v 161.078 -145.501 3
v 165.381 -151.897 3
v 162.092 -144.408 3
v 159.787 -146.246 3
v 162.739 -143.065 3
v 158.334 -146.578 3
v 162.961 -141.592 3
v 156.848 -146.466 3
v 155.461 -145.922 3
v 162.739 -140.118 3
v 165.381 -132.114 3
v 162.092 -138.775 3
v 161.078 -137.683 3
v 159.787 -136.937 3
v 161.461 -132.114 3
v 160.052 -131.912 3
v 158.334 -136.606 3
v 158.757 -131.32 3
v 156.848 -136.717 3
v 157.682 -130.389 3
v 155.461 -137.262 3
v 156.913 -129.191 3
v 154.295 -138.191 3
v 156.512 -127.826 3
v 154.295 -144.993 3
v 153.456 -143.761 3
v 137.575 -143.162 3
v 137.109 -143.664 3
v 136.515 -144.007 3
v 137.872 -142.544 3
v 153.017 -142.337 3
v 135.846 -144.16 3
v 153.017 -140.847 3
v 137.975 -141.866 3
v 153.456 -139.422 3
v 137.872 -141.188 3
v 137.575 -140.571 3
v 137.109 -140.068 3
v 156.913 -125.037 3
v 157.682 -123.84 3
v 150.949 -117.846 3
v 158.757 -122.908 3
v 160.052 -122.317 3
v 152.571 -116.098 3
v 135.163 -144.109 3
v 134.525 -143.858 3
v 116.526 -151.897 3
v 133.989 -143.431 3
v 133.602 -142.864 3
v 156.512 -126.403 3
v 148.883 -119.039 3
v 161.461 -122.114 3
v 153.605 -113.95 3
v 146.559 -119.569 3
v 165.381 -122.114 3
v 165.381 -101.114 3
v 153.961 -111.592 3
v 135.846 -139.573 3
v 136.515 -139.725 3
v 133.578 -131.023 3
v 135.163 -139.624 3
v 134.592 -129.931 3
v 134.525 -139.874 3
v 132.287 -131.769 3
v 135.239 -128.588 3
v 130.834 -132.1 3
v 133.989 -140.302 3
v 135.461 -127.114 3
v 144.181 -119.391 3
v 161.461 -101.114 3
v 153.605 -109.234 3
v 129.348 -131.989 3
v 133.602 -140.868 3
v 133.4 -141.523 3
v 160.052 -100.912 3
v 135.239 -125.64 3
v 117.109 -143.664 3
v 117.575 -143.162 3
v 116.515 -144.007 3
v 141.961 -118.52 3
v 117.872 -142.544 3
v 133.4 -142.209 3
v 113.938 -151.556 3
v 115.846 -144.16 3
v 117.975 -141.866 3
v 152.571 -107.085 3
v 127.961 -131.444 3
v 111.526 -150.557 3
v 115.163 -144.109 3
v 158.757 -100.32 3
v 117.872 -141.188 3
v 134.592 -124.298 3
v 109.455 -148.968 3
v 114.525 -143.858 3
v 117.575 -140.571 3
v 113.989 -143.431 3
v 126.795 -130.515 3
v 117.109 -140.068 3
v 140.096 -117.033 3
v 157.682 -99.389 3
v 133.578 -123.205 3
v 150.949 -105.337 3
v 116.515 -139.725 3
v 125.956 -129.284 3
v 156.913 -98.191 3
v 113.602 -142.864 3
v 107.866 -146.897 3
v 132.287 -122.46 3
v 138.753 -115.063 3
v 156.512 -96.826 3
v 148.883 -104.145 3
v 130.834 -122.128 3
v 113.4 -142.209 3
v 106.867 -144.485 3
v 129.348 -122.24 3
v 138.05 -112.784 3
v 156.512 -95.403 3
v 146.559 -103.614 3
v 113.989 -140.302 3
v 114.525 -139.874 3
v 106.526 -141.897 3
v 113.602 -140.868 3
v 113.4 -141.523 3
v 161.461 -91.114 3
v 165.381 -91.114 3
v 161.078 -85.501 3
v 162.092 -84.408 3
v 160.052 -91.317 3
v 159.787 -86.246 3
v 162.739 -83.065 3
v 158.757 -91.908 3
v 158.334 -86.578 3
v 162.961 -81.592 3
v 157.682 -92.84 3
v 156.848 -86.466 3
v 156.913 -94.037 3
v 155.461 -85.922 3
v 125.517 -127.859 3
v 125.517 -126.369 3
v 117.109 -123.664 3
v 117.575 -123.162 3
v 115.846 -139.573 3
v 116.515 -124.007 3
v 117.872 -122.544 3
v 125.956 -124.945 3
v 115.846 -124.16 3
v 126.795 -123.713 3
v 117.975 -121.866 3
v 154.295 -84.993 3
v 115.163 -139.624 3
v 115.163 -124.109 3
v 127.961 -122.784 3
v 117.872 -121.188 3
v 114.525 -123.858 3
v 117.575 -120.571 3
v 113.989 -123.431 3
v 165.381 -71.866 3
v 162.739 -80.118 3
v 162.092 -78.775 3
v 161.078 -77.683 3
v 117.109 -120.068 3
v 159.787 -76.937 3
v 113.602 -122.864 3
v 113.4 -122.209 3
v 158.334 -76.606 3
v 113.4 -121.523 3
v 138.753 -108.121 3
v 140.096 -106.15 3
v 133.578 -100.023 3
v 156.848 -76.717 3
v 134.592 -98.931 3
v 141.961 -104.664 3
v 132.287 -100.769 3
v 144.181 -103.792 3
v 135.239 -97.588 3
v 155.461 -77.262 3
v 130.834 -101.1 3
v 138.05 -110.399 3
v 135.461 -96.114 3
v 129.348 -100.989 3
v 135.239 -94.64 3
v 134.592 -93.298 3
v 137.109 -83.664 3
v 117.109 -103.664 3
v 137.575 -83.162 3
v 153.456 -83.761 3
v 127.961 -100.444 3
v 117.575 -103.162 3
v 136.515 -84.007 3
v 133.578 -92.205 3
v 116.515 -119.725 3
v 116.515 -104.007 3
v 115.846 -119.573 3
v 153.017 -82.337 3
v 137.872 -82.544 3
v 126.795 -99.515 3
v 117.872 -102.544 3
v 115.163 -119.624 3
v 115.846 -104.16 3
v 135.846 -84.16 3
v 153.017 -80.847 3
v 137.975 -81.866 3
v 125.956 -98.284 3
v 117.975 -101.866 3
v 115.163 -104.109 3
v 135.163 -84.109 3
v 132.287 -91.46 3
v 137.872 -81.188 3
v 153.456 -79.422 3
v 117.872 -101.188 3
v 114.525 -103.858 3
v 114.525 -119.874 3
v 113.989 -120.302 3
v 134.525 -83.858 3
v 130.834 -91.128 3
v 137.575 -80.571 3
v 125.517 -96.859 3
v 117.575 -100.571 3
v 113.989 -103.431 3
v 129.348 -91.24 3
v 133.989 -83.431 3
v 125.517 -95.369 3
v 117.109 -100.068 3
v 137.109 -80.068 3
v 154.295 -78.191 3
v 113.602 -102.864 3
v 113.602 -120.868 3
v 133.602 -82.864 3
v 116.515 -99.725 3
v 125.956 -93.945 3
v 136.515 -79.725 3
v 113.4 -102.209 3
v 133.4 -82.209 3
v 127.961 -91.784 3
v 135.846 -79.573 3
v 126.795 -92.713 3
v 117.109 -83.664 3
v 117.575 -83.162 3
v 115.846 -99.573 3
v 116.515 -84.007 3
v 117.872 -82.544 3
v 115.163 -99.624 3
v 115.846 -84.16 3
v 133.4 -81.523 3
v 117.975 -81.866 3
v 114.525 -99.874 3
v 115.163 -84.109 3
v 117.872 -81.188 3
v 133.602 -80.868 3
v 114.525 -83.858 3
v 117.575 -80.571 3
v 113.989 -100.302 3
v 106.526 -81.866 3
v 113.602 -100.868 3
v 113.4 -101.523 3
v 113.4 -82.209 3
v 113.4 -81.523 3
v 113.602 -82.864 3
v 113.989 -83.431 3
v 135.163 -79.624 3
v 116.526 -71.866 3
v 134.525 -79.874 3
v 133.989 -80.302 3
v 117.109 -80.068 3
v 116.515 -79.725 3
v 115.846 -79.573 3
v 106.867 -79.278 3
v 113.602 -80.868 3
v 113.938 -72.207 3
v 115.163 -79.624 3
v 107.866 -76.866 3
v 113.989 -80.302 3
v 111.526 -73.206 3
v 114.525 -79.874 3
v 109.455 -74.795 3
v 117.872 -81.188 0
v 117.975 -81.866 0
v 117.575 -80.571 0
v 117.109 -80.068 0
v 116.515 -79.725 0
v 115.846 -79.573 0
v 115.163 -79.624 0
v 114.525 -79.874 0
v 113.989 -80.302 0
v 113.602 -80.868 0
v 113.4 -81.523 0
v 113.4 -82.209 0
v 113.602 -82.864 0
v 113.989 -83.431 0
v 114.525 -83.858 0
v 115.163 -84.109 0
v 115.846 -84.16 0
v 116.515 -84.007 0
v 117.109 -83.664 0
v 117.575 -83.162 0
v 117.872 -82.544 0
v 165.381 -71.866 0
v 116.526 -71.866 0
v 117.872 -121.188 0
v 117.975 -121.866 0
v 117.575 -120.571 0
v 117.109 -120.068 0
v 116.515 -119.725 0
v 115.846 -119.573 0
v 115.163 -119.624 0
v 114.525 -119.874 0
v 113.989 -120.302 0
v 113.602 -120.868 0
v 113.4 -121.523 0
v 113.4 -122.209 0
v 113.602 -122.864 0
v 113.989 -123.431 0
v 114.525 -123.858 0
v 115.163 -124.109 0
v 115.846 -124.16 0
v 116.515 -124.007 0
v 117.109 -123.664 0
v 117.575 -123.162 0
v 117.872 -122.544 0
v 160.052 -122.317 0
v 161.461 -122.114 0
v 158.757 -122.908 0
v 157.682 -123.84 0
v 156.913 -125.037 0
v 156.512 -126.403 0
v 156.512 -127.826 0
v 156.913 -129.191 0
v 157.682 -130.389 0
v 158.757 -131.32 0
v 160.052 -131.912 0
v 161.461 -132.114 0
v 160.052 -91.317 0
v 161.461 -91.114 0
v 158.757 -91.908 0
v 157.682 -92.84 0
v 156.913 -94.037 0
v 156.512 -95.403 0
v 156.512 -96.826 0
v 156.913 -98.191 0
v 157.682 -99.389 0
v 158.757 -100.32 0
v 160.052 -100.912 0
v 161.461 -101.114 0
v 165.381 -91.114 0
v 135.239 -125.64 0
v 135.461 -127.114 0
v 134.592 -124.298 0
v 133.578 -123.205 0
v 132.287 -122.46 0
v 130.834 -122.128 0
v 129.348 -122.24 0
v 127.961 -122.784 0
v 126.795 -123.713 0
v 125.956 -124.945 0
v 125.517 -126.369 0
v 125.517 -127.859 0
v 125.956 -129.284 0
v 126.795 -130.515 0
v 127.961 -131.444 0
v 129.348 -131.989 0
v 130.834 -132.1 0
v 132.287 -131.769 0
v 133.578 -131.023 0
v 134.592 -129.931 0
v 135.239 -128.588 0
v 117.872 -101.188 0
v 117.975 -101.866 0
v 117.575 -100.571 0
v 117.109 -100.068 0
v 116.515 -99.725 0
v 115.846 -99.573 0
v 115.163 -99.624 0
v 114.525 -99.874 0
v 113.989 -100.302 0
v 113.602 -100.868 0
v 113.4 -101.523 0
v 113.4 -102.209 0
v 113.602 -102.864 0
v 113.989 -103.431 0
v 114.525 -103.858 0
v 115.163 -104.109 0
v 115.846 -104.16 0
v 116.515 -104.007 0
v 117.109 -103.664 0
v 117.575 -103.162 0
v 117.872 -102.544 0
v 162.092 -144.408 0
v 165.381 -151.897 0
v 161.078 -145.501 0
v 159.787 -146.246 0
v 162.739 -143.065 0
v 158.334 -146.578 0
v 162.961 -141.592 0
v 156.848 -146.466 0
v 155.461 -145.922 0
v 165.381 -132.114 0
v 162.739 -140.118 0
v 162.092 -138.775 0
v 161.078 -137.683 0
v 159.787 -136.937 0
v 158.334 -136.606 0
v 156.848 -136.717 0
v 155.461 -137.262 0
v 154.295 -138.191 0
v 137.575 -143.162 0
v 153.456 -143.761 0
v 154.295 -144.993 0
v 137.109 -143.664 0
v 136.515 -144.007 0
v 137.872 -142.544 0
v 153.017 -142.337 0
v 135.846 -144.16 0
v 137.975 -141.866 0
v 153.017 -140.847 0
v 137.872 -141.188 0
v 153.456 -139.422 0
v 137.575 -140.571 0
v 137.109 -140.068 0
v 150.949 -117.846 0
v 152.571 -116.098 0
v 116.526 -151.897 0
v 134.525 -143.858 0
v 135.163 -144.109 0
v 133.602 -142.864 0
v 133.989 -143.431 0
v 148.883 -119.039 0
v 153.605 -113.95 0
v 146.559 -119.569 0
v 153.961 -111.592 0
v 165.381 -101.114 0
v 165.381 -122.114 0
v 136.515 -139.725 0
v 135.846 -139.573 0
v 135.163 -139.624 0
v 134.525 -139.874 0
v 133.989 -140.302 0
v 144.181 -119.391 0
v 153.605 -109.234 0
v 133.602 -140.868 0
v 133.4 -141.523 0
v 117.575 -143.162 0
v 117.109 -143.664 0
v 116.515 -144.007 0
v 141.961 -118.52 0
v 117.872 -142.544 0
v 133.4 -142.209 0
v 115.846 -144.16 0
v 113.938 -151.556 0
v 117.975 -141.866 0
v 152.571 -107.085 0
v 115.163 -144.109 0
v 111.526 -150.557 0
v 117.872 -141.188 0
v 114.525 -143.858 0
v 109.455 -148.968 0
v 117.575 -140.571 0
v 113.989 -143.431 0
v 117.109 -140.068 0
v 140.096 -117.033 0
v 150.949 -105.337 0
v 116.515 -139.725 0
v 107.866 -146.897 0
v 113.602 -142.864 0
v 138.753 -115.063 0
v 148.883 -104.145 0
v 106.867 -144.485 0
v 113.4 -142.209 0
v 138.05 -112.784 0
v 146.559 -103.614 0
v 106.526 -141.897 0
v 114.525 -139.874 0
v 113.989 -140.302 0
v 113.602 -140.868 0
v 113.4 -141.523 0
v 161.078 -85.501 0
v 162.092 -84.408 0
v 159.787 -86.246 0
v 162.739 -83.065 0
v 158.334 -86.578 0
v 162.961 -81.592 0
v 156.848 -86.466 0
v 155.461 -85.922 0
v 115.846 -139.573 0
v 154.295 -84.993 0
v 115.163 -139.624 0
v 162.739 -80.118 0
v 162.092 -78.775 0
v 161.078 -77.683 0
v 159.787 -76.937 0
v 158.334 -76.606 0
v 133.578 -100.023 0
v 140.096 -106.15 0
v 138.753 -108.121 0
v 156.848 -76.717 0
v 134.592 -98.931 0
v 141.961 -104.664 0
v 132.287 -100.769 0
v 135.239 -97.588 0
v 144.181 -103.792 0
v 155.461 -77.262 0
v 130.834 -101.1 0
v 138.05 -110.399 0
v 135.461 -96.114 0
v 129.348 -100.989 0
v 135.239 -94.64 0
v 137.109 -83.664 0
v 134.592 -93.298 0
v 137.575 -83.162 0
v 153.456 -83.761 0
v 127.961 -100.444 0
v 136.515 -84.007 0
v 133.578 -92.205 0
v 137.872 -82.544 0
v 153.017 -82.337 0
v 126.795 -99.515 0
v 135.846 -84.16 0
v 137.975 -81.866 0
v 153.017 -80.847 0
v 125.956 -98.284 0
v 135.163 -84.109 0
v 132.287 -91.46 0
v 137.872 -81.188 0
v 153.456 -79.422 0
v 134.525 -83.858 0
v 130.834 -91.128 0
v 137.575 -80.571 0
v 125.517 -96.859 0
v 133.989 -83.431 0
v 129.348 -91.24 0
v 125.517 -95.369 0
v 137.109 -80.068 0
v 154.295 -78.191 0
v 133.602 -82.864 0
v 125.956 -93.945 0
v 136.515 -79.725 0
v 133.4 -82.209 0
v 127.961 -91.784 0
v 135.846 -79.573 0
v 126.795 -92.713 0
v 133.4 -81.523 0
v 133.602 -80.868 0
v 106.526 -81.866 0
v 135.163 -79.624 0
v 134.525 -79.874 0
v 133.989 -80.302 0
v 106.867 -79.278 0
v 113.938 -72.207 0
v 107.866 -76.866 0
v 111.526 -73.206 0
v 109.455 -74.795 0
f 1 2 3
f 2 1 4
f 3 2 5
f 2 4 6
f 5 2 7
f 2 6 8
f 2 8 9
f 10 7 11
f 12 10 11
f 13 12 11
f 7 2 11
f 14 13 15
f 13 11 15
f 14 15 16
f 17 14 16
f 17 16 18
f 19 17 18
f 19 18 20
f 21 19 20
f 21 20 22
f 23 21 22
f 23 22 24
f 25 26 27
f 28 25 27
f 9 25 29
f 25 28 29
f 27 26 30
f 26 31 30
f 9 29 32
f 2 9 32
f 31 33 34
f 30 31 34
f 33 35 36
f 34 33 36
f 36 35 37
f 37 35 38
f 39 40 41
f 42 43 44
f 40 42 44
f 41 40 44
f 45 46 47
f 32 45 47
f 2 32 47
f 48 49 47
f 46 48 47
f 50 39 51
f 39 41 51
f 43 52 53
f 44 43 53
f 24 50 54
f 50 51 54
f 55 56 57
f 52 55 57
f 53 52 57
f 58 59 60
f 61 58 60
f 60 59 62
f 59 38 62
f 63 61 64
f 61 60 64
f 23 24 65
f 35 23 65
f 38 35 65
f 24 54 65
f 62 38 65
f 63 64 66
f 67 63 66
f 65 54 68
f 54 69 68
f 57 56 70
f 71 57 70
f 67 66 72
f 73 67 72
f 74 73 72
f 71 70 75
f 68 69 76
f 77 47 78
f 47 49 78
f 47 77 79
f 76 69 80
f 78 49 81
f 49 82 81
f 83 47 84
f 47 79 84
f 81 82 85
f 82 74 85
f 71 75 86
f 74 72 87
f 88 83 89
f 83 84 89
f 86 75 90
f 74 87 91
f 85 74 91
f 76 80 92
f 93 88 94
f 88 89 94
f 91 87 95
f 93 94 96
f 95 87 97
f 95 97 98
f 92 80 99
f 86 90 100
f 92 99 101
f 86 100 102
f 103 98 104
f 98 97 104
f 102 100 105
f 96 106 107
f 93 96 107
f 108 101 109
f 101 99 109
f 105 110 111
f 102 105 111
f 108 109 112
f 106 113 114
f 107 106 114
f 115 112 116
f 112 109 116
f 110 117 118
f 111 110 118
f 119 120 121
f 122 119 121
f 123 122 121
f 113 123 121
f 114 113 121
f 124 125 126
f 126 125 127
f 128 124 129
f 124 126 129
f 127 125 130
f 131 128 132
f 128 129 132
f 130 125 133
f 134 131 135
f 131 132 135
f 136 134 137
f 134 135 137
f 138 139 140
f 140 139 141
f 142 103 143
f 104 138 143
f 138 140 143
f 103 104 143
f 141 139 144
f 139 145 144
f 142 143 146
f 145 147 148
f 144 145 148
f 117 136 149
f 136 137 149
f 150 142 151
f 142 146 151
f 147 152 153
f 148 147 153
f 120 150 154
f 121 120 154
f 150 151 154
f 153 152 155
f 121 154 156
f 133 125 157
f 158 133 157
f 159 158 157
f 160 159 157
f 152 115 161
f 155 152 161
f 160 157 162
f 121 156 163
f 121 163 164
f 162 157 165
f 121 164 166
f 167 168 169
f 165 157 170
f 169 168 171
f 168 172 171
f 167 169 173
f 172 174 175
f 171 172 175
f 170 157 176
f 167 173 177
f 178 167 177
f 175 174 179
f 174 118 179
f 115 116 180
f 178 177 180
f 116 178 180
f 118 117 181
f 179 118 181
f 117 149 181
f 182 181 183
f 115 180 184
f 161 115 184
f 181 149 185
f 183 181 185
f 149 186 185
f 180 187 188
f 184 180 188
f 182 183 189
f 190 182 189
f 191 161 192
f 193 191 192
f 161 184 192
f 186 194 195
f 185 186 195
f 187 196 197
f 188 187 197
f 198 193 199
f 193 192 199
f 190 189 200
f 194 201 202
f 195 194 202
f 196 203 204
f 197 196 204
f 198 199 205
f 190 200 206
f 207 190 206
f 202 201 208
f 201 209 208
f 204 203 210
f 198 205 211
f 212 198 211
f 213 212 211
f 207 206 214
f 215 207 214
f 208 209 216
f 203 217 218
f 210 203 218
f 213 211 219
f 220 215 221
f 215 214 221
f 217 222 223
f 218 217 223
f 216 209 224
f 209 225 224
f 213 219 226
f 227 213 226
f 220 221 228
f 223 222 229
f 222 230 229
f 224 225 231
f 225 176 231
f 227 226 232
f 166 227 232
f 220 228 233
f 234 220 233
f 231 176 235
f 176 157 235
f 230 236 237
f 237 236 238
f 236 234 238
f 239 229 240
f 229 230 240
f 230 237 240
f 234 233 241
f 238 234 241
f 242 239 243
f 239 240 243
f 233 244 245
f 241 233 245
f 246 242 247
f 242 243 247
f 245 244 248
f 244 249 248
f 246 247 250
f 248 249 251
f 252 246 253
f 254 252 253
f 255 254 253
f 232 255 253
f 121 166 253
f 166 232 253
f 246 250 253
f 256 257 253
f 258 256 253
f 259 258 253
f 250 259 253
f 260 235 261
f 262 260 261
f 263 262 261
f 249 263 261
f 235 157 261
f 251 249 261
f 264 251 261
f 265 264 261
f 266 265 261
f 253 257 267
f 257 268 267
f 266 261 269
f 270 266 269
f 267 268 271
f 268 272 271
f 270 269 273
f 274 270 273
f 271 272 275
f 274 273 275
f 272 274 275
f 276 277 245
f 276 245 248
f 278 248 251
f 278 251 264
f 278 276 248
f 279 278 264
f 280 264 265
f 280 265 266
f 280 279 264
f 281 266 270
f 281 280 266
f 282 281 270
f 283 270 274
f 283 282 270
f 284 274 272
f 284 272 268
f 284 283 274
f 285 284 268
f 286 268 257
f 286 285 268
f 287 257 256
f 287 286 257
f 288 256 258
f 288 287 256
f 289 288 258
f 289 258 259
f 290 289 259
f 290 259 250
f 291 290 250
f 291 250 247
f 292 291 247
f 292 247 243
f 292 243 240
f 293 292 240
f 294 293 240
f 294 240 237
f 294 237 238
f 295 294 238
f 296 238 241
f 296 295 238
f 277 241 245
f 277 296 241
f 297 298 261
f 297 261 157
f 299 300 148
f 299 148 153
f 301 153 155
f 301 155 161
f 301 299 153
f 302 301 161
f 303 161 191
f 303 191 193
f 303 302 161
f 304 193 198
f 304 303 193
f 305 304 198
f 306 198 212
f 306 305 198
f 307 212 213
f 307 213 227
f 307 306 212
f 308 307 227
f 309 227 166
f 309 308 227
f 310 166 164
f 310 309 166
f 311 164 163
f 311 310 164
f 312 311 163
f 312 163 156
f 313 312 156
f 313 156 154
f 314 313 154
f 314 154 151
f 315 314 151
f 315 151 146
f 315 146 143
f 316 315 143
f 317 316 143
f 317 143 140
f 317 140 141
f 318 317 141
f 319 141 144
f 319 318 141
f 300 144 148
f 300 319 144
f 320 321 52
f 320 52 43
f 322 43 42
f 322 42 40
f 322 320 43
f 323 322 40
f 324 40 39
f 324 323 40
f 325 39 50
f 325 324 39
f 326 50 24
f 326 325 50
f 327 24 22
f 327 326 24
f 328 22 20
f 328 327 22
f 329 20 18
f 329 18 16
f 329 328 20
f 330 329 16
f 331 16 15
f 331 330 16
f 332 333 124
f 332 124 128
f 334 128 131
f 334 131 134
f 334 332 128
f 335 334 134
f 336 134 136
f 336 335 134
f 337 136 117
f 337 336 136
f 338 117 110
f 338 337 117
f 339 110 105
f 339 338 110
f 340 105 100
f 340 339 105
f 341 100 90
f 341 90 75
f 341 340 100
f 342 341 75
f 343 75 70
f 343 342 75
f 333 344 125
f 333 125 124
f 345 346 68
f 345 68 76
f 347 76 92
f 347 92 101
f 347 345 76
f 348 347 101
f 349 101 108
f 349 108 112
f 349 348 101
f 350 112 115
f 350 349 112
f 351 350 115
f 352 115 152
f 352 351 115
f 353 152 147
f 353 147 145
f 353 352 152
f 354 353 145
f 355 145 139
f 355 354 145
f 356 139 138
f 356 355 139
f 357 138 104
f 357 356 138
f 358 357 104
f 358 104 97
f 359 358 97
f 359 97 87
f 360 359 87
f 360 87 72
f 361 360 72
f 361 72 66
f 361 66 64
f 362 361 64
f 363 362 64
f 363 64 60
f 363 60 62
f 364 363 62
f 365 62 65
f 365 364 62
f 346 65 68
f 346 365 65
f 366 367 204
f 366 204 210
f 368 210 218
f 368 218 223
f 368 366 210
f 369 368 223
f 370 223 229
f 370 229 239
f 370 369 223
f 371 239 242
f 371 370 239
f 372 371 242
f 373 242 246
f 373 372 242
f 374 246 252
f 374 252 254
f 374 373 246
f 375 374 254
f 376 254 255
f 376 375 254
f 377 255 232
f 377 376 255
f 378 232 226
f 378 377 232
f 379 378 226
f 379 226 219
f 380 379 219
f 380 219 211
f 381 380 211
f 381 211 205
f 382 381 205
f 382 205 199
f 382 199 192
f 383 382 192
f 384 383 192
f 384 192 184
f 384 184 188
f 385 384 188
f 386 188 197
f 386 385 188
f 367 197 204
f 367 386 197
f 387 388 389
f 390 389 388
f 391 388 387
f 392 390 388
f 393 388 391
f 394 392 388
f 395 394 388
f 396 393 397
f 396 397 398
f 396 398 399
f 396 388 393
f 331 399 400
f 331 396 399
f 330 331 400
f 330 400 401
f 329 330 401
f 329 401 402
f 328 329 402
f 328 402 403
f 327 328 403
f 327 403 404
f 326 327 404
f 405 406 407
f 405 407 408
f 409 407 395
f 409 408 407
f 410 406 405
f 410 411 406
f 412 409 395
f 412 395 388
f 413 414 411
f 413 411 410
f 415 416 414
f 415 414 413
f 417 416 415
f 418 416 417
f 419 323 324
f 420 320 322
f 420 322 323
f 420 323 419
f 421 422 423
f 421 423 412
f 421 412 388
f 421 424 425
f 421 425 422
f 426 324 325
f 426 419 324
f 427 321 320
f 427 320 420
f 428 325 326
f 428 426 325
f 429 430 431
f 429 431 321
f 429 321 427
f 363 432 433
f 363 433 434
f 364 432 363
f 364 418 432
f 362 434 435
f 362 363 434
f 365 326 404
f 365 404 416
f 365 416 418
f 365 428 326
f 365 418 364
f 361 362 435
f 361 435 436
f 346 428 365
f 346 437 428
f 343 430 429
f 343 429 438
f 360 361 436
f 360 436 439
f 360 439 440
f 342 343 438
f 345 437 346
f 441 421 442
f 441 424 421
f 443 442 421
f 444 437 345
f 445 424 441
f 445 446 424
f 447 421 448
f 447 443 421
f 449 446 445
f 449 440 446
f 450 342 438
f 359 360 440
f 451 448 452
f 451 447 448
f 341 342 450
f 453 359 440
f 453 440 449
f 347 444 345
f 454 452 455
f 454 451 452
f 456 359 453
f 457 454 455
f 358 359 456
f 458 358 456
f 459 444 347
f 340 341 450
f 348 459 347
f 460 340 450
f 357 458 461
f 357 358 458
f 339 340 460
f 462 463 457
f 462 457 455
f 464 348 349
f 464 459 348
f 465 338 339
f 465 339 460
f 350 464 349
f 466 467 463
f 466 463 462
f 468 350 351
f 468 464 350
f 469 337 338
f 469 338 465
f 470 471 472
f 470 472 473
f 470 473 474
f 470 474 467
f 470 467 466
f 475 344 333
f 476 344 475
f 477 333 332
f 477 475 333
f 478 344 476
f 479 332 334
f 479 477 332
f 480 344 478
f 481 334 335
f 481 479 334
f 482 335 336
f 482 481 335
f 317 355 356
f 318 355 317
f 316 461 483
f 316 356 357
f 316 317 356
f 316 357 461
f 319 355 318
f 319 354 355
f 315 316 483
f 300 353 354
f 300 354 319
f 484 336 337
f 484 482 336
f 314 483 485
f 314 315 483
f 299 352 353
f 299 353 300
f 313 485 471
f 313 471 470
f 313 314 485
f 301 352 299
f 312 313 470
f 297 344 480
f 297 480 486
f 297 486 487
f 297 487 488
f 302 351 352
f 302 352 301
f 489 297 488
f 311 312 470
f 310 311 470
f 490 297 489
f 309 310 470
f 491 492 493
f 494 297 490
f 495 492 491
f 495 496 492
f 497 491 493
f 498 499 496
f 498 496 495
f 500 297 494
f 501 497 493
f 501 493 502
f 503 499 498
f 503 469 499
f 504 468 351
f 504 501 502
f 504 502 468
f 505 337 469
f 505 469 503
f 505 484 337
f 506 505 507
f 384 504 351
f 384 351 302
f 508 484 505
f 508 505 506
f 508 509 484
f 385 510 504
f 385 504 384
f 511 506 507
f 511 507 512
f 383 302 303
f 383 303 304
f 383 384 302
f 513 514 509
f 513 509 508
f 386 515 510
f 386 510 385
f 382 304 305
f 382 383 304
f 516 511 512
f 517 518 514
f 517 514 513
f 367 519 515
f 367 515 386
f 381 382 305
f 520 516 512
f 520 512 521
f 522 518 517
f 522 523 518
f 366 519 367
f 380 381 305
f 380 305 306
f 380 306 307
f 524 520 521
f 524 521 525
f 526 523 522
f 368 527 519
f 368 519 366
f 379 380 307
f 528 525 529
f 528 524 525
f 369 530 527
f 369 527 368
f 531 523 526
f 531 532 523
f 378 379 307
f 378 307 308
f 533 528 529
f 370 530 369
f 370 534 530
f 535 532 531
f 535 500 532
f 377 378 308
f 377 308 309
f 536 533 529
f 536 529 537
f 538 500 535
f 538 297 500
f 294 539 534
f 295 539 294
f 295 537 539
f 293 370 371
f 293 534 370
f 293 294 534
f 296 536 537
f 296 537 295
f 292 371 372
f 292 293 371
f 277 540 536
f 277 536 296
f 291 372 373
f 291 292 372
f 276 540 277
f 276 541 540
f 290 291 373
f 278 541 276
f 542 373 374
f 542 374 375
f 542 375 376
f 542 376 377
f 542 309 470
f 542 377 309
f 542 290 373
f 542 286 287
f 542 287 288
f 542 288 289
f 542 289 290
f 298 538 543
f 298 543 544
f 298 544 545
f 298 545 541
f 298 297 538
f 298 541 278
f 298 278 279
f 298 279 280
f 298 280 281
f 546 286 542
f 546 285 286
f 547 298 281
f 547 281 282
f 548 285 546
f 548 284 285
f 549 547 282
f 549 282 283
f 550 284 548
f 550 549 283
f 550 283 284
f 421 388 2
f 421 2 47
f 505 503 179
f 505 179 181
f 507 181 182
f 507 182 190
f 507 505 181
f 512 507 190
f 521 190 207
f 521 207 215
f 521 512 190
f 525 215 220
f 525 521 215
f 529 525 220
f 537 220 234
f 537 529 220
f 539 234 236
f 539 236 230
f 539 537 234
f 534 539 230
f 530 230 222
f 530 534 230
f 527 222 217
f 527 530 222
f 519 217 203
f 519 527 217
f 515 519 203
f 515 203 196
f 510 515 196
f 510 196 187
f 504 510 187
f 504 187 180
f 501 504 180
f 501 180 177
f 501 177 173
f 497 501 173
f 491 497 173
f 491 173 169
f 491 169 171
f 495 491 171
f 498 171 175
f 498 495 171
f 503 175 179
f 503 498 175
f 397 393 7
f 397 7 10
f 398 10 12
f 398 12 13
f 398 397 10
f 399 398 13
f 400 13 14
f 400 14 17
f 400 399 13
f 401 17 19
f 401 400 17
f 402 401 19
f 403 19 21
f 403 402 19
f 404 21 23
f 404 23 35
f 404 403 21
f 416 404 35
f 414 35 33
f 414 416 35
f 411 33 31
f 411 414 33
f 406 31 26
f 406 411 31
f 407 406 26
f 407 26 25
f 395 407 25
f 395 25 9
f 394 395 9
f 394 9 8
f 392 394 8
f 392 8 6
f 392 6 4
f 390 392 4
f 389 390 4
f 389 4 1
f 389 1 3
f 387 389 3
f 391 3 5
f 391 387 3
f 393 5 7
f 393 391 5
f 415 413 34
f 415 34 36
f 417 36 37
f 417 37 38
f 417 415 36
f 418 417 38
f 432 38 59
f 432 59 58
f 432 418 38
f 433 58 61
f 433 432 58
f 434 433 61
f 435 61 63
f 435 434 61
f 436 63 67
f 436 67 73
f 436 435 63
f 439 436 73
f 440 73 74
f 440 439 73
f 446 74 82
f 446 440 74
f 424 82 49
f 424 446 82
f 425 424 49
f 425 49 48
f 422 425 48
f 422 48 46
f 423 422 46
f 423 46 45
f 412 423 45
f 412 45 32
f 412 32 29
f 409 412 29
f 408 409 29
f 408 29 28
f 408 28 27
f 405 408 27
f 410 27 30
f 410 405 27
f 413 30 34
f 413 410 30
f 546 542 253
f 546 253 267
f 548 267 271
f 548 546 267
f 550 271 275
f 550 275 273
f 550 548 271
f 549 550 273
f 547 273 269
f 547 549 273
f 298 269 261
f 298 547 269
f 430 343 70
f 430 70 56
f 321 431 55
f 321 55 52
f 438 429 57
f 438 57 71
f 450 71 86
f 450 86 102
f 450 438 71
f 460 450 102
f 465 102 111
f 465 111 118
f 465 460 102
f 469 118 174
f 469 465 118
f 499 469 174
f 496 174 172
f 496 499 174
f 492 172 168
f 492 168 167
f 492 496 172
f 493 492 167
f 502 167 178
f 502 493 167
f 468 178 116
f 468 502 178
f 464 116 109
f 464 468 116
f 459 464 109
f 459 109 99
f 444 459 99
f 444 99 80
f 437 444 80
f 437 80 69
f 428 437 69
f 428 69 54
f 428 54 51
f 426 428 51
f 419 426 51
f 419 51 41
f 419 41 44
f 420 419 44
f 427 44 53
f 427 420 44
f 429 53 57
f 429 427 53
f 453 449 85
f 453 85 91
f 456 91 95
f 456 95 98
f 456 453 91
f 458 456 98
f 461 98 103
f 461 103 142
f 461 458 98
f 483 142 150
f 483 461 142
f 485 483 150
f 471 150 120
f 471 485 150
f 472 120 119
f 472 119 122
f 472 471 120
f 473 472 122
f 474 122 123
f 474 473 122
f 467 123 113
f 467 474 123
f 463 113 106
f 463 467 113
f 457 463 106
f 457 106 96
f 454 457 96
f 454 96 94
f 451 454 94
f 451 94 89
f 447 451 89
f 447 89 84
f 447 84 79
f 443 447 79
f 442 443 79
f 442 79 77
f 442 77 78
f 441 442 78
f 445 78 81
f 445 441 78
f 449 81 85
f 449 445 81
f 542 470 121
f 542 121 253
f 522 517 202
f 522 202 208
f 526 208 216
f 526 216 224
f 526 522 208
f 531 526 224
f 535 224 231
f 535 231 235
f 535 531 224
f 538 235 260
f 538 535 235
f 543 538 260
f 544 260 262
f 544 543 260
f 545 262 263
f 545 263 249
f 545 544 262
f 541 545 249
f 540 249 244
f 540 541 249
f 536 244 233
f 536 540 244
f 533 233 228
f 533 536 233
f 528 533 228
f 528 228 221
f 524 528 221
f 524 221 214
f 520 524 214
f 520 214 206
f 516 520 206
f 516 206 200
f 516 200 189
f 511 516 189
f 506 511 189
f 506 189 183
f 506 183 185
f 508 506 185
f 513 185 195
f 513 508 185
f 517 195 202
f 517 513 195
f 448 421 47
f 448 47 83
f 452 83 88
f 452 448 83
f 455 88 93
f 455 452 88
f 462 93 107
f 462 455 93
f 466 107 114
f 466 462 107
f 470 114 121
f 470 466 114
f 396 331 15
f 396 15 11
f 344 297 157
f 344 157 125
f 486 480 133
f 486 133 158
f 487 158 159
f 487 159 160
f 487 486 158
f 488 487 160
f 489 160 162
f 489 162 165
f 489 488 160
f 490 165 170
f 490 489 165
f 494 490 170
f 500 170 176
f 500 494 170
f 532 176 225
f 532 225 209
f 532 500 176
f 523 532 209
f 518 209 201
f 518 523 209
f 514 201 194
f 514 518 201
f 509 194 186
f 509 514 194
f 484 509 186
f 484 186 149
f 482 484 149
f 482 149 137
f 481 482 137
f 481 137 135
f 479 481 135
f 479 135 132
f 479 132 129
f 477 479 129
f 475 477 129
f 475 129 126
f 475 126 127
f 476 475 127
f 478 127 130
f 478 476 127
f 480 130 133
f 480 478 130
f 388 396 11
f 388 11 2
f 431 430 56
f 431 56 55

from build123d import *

# Parameters (mm, degrees)
SKETCH1_R           = 2.3
SKETCH1_R_2         = 5
SKETCH1_R_3         = 8
BOSS_EXTRUDE1_DEPTH = 3


with BuildPart() as part:
    # Sketch1 → Boss-Extrude1 (new body)
    with BuildSketch(Plane.XY):
        with BuildLine():
            Line((157.960700719, -71.866196008), (165.380720324, -71.866196008))
            Line((165.380720324, -71.866196008), (165.380720324, -91.114221831))
            Line((165.380720324, -91.114221831), (161.460700719, -91.114221831))
            ThreePointArc((161.460700719, -91.114221831), (156.460700719, -96.114221831), (161.460700719, -101.114221831))
            Line((161.460700719, -101.114221831), (165.380720324, -101.114221831))
            Line((165.380720324, -101.114221831), (165.380720324, -122.114221831))
            Line((165.380720324, -122.114221831), (161.460700719, -122.114221831))
            ThreePointArc((161.460700719, -122.114221831), (156.460700719, -127.114221831), (161.460700719, -132.114221831))
            Line((161.460700719, -132.114221831), (165.380720324, -132.114221831))
            Line((165.380720324, -132.114221831), (165.380720324, -151.896756479))
            Line((165.380720324, -151.896756479), (157.960700719, -151.896756479))
            Line((157.960700719, -151.896756479), (116.525823666, -151.896756479))
            ThreePointArc((116.525823666, -151.896756479), (109.454755854, -148.967824291), (106.525823666, -141.896756479))
            Line((106.525823666, -141.896756479), (106.525823666, -81.866196008))
            ThreePointArc((106.525823666, -81.866196008), (109.454755854, -74.795128196), (116.525823666, -71.866196008))
            Line((116.525823666, -71.866196008), (157.960700719, -71.866196008))
        make_face()
        with Locations((115.674612816, -101.866196008)):
            Circle(SKETCH1_R, mode=Mode.SUBTRACT)
        with Locations((115.674612816, -121.866196008)):
            Circle(SKETCH1_R, mode=Mode.SUBTRACT)
        with Locations((135.674612816, -141.866196008)):
            Circle(SKETCH1_R, mode=Mode.SUBTRACT)
        with Locations((135.674612816, -81.866196008)):
            Circle(SKETCH1_R, mode=Mode.SUBTRACT)
        with Locations((115.674612816, -81.866196008)):
            Circle(SKETCH1_R, mode=Mode.SUBTRACT)
        with Locations((115.674612816, -141.866196008)):
            Circle(SKETCH1_R, mode=Mode.SUBTRACT)
        with Locations((130.460700719, -96.114221831)):
            Circle(SKETCH1_R_2, mode=Mode.SUBTRACT)
        with Locations((145.960700719, -111.591712302)):
            Circle(SKETCH1_R_3, mode=Mode.SUBTRACT)
        with Locations((130.460700719, -127.114221831)):
            Circle(SKETCH1_R_2, mode=Mode.SUBTRACT)
        with Locations((157.960700719, -81.591712302)):
            Circle(SKETCH1_R_2, mode=Mode.SUBTRACT)
        with Locations((157.960700719, -141.591712302)):
            Circle(SKETCH1_R_2, mode=Mode.SUBTRACT)
    extrude(amount=BOSS_EXTRUDE1_DEPTH)


solid = part.part
